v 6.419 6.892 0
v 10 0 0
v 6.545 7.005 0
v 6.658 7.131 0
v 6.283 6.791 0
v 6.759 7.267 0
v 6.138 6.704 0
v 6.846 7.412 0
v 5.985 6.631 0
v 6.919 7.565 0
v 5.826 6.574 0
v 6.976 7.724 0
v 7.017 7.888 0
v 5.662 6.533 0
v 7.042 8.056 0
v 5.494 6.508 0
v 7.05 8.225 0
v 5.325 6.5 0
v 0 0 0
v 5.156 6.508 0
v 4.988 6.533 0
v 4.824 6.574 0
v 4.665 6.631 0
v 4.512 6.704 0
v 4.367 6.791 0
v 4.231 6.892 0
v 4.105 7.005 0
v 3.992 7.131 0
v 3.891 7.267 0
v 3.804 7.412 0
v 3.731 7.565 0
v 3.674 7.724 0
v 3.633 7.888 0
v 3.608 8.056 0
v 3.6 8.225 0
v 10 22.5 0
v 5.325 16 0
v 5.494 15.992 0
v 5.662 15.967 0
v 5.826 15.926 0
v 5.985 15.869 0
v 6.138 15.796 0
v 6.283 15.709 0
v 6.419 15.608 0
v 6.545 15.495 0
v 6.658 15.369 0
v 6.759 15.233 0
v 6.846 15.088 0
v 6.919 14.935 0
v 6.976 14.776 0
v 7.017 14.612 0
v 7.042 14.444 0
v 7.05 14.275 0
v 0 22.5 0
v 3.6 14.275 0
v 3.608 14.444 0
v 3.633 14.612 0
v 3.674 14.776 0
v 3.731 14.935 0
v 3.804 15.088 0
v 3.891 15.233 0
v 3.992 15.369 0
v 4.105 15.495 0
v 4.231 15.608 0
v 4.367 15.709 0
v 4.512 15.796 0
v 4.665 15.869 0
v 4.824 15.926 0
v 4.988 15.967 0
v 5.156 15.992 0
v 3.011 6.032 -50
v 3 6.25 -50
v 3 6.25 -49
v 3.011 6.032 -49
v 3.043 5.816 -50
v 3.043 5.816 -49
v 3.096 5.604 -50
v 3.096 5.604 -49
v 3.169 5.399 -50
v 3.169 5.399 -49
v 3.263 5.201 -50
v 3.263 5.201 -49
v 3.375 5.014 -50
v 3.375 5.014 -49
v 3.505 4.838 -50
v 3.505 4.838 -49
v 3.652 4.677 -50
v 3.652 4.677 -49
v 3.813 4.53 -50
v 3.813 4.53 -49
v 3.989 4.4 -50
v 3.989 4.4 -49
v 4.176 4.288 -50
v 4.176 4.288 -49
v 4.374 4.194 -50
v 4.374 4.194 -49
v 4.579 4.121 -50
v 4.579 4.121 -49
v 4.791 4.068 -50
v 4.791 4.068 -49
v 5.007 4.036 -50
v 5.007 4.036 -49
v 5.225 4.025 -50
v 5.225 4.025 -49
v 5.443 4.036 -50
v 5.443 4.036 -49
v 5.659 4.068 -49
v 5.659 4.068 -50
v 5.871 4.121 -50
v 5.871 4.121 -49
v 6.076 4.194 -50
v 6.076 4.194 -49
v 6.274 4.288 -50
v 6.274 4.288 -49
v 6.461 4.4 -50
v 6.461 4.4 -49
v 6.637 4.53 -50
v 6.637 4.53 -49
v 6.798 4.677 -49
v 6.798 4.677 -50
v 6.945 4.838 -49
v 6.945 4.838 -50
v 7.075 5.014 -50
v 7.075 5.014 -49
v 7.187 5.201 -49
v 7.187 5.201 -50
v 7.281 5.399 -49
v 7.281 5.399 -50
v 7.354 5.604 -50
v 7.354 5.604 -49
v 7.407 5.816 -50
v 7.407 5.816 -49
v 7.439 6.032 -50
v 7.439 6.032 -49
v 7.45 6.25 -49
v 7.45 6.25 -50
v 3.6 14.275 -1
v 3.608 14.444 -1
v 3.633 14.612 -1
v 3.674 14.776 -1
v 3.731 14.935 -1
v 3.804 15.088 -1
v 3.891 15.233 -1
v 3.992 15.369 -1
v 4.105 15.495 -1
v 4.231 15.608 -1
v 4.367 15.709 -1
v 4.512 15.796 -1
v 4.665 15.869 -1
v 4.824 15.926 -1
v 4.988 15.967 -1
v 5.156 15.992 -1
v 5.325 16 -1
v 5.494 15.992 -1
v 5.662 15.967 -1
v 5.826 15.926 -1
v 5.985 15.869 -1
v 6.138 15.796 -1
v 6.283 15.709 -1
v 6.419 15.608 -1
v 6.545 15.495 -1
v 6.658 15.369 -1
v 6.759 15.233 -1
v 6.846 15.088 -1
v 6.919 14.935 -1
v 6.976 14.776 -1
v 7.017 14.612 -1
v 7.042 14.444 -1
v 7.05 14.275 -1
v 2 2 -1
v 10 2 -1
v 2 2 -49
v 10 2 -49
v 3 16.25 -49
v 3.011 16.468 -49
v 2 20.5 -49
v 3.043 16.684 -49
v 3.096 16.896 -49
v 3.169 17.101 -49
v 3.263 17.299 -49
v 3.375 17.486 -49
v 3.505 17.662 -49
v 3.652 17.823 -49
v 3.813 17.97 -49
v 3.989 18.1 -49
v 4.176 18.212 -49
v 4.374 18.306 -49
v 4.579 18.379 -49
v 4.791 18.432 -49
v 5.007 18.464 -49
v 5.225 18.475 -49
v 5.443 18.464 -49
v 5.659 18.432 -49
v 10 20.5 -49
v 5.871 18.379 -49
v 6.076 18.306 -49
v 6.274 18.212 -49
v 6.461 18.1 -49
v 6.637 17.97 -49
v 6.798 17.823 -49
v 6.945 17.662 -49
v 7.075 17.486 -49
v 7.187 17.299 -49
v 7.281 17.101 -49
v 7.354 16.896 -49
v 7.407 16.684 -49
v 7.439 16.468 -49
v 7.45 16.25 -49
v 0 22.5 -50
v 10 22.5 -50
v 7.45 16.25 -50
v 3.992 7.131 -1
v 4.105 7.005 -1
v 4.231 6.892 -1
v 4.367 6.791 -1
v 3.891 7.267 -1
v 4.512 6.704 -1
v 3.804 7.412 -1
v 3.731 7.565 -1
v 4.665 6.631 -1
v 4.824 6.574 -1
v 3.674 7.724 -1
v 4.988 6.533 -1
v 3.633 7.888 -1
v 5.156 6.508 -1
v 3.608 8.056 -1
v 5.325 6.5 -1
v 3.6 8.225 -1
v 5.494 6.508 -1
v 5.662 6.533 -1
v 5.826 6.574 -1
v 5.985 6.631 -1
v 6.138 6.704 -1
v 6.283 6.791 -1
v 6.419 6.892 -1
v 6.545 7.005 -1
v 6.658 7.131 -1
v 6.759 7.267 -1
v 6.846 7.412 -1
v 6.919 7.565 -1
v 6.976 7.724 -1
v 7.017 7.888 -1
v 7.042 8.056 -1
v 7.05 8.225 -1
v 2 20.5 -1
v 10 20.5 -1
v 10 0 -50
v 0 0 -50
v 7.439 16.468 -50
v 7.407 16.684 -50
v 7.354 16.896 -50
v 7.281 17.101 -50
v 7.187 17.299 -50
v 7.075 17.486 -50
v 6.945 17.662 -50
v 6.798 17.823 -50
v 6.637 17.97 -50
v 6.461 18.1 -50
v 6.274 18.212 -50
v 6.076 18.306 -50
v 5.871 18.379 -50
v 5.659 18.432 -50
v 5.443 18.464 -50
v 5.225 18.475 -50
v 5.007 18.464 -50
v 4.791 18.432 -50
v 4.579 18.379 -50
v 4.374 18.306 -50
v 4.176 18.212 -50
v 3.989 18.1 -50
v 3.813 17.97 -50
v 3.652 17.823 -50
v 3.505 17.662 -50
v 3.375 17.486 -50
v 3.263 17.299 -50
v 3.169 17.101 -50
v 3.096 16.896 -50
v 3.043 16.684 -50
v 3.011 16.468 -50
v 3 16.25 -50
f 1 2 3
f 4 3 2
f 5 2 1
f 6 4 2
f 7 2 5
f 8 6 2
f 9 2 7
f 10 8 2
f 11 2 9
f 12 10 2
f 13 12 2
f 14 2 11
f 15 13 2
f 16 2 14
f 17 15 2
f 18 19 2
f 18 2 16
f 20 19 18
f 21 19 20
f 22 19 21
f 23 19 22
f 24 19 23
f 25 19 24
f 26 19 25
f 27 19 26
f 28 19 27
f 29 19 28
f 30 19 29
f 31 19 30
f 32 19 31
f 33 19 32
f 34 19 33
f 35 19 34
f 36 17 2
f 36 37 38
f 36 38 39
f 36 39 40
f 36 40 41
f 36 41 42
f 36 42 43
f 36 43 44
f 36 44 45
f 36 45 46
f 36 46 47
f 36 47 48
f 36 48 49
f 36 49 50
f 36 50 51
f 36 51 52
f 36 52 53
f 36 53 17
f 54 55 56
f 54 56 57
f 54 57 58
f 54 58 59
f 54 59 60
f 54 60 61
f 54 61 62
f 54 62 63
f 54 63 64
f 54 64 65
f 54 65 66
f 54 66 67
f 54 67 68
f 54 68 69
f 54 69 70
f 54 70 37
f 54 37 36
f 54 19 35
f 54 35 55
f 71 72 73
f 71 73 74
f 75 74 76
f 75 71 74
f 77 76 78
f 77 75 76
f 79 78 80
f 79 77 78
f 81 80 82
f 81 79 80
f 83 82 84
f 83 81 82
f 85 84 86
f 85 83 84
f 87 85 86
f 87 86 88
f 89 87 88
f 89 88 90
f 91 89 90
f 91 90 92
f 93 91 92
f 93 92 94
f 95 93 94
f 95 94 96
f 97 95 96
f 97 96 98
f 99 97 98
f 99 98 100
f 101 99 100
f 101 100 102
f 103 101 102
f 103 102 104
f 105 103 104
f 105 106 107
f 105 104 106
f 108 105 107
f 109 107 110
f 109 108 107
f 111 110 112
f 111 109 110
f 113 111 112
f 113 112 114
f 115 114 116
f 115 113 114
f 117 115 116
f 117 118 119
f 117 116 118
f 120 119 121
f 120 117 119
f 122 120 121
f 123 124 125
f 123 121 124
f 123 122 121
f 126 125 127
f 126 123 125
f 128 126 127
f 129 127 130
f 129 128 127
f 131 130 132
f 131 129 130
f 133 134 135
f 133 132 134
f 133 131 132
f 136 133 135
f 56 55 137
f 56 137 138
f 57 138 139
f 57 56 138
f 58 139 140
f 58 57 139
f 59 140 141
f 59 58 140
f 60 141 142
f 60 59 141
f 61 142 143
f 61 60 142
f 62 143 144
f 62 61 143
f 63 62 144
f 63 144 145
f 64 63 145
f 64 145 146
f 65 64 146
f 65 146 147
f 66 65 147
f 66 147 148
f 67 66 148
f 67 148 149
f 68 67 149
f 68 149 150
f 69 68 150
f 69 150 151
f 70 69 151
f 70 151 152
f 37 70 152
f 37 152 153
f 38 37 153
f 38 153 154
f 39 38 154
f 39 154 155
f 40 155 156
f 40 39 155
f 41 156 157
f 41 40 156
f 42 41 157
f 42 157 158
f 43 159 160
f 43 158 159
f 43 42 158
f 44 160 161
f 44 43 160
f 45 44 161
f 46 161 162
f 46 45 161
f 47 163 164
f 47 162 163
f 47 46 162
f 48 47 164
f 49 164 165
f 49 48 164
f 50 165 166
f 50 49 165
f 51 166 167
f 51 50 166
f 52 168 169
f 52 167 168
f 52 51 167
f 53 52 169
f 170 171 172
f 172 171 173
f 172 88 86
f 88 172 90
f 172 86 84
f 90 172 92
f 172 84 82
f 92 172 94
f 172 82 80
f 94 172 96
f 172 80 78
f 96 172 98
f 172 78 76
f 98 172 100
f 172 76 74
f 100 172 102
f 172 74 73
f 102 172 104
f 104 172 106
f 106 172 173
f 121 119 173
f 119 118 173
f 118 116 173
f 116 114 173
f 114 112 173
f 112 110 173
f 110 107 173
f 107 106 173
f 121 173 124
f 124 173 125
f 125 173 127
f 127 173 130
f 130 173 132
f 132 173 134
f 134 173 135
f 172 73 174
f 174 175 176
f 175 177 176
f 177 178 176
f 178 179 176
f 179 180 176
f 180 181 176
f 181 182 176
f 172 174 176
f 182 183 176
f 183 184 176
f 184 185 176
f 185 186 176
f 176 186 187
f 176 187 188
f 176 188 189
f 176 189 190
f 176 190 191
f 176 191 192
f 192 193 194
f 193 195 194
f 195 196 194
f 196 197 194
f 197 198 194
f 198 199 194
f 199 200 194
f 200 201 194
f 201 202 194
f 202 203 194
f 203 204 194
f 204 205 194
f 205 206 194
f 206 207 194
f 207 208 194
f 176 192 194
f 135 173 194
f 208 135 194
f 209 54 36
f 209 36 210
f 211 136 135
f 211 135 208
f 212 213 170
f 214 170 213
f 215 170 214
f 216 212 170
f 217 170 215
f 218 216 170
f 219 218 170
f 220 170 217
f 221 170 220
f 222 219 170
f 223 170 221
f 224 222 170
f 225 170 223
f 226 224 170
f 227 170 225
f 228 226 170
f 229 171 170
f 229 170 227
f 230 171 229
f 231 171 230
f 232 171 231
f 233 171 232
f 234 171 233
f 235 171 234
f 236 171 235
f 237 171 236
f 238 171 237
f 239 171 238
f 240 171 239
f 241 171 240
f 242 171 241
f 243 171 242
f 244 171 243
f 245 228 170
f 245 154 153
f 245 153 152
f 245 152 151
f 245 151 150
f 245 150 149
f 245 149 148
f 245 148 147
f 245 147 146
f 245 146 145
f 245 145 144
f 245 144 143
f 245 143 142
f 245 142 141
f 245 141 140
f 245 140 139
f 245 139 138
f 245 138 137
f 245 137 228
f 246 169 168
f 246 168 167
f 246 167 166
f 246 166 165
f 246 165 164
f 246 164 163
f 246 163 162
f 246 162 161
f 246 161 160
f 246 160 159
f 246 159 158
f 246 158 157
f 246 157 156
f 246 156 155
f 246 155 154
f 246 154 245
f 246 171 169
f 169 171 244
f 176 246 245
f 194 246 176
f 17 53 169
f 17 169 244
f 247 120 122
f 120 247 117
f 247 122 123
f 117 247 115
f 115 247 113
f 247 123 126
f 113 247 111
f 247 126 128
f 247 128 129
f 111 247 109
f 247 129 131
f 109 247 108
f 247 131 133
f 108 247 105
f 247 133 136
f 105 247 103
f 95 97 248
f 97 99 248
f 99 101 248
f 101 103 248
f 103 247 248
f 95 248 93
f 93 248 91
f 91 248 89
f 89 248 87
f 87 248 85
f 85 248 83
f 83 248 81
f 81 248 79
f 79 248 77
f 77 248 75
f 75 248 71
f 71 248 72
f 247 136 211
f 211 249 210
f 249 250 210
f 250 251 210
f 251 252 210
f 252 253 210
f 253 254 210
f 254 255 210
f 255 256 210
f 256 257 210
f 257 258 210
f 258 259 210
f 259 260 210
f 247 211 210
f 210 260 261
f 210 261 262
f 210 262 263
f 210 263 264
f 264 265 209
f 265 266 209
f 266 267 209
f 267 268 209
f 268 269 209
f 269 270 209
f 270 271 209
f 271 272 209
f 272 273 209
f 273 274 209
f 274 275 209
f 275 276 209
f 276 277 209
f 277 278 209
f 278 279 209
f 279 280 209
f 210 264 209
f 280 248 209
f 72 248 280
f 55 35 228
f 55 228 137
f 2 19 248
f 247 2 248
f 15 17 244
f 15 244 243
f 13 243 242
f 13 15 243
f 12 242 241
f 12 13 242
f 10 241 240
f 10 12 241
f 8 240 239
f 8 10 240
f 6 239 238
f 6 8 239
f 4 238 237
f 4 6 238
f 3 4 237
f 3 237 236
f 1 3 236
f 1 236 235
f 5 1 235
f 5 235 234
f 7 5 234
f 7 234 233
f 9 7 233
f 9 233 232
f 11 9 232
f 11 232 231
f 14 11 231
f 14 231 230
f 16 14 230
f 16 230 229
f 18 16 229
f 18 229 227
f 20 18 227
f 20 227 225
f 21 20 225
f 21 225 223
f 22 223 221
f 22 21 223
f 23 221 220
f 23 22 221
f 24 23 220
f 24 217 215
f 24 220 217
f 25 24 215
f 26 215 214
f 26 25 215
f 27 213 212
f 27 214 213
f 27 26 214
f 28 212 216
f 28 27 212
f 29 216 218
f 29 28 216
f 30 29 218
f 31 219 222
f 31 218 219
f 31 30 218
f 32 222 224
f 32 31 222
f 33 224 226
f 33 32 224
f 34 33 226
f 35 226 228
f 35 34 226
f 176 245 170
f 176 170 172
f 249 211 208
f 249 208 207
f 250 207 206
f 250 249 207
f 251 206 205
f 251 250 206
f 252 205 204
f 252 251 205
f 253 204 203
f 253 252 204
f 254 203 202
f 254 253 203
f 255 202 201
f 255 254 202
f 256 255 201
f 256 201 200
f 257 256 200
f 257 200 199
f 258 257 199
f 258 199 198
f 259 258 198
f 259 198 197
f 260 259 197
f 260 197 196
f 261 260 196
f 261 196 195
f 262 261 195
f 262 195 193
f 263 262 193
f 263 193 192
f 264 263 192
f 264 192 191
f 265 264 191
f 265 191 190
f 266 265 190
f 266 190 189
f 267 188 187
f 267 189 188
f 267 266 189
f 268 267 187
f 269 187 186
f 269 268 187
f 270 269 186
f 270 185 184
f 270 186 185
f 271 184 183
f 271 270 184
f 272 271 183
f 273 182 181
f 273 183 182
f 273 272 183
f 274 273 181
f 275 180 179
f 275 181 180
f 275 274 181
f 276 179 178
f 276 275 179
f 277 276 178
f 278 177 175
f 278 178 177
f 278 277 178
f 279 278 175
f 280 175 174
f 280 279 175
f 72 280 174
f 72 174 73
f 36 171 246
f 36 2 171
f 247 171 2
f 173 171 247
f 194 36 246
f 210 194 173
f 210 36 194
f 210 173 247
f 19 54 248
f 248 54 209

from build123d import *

# Parameters (mm, degrees)
SKETCH2_W           = 50
SKETCH2_H           = 22.5
BOSS_EXTRUDE1_DEPTH = 10
USBC_DEPTH          = 10
POGO_DEPTH          = 10
SKETCH6_W           = 48
SKETCH6_H           = 18.5
CUT_EXTRUDE3_DEPTH  = 8


with BuildPart() as part:
    # Sketch2 → Boss-Extrude1 (new body)
    with BuildSketch(Plane(origin=(0, 0, 0), x_dir=(0, 0, -1), z_dir=(1, 0, 0))):
        with Locations((25, 11.25)):
            Rectangle(SKETCH2_W, SKETCH2_H)
    extrude(amount=BOSS_EXTRUDE1_DEPTH)

    # Sketch4 → USBC (cut)
    with BuildSketch(Plane.XY):
        with BuildLine():
            Line((7.05, 14.275), (7.05, 8.225))
            ThreePointArc((7.05, 8.225), (5.325, 6.5), (3.6, 8.225))
            Line((3.6, 8.225), (3.6, 14.275))
            ThreePointArc((3.6, 14.275), (5.325, 16), (7.05, 14.275))
        make_face()
    extrude(amount=-USBC_DEPTH, mode=Mode.SUBTRACT)

    # Sketch5 → POGO (cut)
    with BuildSketch(Plane(origin=(0, 0, -50), x_dir=(-1, 0, 0), z_dir=(0, 0, -1))):
        with BuildLine():
            Line((-3, 16.25), (-3, 6.25))
            ThreePointArc((-3, 6.25), (-5.225, 4.025), (-7.45, 6.25))
            Line((-7.45, 6.25), (-7.45, 16.25))
            ThreePointArc((-7.45, 16.25), (-5.225, 18.475), (-3, 16.25))
        make_face()
    extrude(amount=-POGO_DEPTH, mode=Mode.SUBTRACT)

    # Sketch6 → Cut-Extrude3 (cut)
    with BuildSketch(Plane(origin=(10, 0, 0), x_dir=(0, 0, -1), z_dir=(1, 0, 0))):
        with Locations((25, 11.25)):
            Rectangle(SKETCH6_W, SKETCH6_H)
    extrude(amount=-CUT_EXTRUDE3_DEPTH, mode=Mode.SUBTRACT)


solid = part.part
